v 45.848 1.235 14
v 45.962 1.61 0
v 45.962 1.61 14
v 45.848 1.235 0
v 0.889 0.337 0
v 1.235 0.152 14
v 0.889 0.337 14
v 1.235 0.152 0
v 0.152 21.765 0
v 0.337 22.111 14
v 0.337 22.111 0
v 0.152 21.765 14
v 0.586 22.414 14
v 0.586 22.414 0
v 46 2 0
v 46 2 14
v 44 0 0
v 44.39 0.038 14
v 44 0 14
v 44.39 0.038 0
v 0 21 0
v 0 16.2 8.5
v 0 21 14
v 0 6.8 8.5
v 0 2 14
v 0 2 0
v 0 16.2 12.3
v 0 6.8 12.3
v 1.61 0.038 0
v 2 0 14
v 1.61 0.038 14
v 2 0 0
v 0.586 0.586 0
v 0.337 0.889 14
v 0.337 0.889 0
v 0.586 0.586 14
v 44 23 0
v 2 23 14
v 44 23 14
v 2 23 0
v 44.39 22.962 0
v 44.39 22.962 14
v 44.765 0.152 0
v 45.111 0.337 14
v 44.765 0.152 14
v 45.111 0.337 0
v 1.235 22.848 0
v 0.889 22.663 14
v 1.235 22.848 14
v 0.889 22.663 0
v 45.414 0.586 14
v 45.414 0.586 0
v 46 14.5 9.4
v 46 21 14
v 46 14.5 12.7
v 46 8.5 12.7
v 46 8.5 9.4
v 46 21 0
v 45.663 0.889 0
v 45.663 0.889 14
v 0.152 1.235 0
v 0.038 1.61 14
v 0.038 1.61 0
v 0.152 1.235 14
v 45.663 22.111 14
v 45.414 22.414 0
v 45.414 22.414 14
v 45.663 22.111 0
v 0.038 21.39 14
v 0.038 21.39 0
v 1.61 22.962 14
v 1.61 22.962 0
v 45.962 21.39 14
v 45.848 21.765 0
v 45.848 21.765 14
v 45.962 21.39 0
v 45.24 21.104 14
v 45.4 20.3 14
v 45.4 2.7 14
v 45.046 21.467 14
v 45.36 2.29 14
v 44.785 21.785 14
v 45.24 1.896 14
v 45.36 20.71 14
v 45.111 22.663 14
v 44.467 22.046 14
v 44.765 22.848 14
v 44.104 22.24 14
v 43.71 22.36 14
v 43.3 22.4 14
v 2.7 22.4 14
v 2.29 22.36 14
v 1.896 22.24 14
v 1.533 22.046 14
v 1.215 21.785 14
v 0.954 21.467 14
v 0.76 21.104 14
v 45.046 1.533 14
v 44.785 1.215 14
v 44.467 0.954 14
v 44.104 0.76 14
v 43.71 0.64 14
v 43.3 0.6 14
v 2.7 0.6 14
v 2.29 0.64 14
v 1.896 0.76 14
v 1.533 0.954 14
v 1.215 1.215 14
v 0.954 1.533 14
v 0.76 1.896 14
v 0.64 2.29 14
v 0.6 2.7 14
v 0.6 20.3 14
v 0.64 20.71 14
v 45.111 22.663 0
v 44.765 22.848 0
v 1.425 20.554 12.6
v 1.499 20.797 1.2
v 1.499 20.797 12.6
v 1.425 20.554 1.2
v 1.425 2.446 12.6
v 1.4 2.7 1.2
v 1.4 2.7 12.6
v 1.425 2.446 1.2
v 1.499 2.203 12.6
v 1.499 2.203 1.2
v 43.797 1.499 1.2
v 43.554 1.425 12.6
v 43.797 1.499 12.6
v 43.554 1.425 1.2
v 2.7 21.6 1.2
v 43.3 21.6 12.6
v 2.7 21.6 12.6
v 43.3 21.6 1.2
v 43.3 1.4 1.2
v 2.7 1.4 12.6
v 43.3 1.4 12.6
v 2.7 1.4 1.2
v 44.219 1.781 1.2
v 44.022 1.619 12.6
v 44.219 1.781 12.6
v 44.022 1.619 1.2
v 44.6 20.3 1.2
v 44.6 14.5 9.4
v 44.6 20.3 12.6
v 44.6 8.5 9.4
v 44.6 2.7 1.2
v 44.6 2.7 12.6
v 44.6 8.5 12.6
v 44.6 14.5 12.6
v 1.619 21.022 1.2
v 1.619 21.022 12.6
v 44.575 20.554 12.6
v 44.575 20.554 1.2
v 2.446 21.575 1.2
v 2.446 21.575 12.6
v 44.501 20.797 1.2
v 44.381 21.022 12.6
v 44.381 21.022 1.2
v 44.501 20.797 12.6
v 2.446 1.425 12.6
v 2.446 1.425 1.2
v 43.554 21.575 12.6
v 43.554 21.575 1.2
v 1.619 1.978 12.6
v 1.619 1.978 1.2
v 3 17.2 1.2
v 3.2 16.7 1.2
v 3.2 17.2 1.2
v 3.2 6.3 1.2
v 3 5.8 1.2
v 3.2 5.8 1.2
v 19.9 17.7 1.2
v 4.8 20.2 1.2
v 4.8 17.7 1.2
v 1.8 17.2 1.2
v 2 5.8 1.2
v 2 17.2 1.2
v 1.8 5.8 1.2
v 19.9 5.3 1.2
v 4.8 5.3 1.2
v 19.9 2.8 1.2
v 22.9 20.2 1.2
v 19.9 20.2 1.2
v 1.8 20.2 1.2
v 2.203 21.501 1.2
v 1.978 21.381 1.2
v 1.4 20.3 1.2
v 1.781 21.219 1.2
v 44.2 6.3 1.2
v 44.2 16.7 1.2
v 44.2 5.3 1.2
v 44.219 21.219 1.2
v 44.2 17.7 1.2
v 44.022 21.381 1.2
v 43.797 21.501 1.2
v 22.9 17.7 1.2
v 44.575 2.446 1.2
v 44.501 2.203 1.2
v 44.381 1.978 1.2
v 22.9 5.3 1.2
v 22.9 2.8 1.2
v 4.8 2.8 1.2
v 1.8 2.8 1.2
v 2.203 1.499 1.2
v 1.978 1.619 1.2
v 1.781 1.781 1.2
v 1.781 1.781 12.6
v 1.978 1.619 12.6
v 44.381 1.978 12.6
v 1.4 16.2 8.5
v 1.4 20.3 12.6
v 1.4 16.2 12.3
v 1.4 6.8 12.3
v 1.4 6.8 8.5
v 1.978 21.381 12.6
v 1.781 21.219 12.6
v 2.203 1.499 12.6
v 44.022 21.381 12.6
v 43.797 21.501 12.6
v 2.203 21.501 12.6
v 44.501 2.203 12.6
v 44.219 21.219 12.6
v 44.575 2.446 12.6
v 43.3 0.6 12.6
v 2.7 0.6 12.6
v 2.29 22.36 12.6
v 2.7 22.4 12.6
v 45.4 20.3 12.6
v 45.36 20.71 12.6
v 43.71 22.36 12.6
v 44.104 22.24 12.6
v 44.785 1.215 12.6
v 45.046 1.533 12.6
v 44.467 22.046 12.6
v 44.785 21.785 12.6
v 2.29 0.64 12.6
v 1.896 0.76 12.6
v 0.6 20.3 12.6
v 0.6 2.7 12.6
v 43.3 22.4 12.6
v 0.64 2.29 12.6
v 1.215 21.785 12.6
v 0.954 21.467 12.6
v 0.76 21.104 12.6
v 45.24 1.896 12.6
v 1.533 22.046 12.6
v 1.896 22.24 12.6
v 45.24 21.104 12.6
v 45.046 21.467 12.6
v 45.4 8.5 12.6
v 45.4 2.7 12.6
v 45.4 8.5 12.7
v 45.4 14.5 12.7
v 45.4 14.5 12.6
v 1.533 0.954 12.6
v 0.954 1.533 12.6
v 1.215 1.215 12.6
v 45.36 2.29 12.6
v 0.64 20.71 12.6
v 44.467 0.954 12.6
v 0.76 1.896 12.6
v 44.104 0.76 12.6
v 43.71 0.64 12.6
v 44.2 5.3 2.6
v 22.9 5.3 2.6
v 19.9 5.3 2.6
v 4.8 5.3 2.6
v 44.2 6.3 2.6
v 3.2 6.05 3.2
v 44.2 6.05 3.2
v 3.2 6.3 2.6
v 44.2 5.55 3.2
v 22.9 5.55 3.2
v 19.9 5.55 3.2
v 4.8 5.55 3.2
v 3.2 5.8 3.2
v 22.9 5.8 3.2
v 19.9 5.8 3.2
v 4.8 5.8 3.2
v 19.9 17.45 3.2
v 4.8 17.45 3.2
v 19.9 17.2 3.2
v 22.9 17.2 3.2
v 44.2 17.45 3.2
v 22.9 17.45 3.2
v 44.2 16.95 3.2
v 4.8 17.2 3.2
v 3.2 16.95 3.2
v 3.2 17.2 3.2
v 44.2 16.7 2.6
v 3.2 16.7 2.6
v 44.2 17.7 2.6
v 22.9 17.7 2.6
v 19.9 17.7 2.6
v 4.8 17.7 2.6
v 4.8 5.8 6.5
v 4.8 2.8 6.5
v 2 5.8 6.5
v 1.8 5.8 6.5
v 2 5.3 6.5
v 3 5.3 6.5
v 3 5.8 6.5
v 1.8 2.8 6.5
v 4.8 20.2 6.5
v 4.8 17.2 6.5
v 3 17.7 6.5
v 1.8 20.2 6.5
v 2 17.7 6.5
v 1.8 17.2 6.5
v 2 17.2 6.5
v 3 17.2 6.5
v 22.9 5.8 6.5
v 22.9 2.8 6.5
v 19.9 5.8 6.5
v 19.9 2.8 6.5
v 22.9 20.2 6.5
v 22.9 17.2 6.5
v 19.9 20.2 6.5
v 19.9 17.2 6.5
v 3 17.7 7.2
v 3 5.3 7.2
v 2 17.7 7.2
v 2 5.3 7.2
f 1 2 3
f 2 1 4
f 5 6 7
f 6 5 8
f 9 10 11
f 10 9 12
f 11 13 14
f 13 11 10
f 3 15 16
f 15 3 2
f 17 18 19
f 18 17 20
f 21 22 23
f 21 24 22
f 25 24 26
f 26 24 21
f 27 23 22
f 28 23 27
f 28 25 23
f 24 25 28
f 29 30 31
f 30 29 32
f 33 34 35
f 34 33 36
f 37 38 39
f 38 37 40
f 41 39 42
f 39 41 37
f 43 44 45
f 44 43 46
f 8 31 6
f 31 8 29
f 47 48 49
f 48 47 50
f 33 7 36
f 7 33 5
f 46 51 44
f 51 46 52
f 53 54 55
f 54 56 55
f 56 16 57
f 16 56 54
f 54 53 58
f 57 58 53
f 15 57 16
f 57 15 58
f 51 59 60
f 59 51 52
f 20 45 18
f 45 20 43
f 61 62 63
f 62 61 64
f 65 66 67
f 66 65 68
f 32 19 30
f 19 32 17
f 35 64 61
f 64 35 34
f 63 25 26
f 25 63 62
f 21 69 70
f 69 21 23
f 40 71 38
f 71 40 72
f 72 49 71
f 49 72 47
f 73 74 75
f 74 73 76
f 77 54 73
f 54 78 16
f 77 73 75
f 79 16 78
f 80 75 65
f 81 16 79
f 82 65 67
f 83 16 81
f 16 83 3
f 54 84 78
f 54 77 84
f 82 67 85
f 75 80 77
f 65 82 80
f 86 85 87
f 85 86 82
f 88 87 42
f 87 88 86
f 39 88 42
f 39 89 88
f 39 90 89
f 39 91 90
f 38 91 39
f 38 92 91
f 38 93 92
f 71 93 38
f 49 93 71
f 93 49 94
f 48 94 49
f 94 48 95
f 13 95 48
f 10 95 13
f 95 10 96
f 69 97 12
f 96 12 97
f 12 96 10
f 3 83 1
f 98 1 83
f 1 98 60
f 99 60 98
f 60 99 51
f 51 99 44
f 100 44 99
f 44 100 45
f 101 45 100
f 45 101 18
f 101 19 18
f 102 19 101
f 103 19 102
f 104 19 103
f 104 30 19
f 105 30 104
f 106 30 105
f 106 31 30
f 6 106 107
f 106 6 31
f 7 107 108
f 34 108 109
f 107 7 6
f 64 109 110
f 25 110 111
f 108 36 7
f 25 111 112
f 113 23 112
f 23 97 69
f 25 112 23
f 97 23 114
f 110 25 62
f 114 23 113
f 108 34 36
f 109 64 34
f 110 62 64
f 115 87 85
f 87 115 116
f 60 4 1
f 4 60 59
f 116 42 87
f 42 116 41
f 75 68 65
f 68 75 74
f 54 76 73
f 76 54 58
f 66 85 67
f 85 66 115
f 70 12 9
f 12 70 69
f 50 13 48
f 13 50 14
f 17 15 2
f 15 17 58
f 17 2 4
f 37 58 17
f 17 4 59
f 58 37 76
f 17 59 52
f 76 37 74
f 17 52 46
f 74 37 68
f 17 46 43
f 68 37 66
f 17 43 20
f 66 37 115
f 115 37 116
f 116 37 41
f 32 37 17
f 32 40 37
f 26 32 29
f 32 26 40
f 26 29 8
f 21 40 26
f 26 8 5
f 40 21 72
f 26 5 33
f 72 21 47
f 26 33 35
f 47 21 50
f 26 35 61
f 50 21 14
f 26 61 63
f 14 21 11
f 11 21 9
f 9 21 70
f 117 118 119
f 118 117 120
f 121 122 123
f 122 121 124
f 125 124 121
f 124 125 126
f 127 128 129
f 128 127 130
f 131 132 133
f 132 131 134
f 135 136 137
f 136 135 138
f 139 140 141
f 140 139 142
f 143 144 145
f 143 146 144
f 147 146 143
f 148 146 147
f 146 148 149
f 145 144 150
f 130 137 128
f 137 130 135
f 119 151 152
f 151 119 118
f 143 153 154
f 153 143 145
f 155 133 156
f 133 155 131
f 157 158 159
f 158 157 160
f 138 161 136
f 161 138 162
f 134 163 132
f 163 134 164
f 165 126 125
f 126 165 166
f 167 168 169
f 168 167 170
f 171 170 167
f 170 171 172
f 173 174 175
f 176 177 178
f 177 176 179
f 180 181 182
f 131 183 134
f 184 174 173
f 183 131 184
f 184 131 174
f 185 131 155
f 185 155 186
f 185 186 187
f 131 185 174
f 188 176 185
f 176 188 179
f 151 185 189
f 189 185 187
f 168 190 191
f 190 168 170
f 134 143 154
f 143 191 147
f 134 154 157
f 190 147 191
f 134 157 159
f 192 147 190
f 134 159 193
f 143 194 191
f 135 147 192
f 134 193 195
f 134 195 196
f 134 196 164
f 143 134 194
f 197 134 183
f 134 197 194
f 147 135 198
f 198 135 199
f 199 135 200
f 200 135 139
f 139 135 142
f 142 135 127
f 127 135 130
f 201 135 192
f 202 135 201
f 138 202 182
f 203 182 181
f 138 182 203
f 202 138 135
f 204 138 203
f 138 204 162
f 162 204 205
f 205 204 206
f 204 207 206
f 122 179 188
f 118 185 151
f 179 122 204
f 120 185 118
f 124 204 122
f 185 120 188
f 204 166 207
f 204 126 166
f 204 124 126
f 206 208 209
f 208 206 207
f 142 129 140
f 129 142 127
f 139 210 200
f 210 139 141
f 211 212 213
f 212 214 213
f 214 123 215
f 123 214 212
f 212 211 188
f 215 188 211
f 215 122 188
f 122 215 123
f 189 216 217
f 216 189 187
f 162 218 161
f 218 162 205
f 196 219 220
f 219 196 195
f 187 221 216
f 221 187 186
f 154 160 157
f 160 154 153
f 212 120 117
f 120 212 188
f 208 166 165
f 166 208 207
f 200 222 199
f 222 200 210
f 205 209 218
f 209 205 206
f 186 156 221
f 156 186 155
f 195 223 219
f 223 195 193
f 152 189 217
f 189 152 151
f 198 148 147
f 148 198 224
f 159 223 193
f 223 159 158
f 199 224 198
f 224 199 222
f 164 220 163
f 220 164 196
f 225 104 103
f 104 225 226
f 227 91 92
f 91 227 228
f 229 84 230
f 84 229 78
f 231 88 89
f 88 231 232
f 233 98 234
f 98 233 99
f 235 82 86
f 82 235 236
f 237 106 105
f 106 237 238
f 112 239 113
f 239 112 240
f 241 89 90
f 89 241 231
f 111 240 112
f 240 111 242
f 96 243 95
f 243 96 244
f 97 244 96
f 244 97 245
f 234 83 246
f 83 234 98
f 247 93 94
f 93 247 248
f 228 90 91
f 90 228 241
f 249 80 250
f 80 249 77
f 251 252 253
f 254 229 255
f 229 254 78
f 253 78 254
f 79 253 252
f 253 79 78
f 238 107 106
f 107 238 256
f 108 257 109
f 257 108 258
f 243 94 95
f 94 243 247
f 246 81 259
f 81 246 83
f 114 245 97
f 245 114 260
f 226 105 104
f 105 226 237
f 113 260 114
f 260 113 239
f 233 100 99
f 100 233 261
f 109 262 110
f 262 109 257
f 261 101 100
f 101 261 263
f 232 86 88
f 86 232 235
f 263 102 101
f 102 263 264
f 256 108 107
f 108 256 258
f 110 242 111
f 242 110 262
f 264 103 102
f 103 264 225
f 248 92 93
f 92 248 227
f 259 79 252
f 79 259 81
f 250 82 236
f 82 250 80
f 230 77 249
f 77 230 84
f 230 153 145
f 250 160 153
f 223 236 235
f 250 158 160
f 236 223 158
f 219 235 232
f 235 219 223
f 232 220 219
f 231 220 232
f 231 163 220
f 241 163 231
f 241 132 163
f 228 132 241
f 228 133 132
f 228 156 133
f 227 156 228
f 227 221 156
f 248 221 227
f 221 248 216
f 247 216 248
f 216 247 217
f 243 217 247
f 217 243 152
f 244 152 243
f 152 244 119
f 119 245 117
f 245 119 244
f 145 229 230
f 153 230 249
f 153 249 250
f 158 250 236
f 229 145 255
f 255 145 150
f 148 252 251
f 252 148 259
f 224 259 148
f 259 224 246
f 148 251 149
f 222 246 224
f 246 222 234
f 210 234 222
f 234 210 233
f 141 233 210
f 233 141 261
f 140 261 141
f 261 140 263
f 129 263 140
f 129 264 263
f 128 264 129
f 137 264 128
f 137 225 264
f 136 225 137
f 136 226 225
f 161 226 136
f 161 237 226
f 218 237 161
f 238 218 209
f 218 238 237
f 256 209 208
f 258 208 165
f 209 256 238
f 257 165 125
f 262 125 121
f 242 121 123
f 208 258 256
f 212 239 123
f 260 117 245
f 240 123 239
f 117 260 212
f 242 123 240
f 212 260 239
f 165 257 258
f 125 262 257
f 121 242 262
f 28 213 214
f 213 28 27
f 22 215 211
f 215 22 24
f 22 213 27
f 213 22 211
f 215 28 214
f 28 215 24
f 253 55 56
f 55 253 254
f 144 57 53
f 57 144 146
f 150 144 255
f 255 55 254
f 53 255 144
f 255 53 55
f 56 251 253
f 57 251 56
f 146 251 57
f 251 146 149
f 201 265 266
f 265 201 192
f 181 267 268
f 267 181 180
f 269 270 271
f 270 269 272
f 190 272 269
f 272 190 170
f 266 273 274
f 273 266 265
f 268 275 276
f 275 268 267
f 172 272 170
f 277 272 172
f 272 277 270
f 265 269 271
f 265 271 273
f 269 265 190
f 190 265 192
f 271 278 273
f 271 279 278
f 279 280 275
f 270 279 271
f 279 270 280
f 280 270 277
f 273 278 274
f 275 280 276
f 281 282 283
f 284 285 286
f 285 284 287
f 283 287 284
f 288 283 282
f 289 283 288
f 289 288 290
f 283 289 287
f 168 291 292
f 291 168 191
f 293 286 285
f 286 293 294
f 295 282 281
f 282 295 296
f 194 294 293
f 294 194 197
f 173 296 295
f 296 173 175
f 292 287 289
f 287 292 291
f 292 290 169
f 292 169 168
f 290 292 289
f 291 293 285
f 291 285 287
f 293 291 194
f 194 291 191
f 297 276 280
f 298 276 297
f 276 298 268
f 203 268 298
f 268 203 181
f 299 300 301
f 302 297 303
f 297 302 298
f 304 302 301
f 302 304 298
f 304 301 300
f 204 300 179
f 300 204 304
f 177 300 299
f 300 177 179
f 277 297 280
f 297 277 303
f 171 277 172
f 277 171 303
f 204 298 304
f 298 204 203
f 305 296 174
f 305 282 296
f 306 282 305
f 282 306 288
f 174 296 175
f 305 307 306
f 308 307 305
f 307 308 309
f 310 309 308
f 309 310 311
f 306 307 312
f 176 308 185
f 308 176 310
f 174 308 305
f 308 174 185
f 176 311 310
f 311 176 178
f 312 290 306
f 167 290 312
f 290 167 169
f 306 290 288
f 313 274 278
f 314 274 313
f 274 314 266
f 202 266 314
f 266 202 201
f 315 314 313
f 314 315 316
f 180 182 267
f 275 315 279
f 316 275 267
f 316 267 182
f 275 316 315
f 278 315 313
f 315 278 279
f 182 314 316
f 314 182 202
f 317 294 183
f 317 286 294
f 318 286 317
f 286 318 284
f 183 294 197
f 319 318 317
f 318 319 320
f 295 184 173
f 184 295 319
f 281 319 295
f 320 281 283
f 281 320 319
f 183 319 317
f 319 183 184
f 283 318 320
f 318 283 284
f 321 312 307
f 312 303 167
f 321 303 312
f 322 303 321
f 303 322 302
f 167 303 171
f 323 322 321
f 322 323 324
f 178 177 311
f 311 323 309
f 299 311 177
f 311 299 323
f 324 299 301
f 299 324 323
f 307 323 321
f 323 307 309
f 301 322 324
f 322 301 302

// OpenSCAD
// bt_case.scad — parametric alternative to the provided enclosure (bt_case_base/lid.stl,
// also in ../enclosure/) for XIAO nRF52840 + 41x10x6 mm LiPo (brief §11, §12).
// Outer ≈ 46 x 23 x 14 mm, flush friction lid. Edit the parameters to fit other parts.
//
// Render:  openscad -D 'part="base"' -o bt_case_param_base.stl bt_case.scad
//          openscad -D 'part="lid"'  -o bt_case_param_lid.stl  bt_case.scad
//          openscad -D 'part="pads"' -o bt_case_param_pads.stl bt_case.scad   (TPU, or 1 mm silicone bumpers)
//
// Cell retention (§12): the pouch lies in a floor channel. Four corner columns stop
// one pad-thickness below a shelf plane `shelf_gap` (0.3 mm) above the pouch top; soft
// pads on them carry the PCB, so the board retains the cell without pressing on it.
// A hard spacer wall keeps the pouch out of the USB-C slot end.
part = "base";           // "base" | "lid" | "pads" | "both"

$fn = 32;
wall = 1.4;
floor_t = 1.2;
outer = [46, 23, 14];
lid_t = 1.4;             // lid plate, sits in a rebate flush with the rim
rebate = 0.8;            // rebate width cut into the wall top for the flush lid
lip_h = 2.0;             // friction lip depth under the lid plate
fit = 0.15;              // clearance per side for the friction fit
r = 2.0;                 // corner radius

board = [21.5, 17.8, 1.2];      // XIAO PCB
batt = [41, 10, 6];             // LiPo pouch
usb = [9.4, 3.8];               // USB-C opening (w x h)
shelf_gap = 0.3;                // board underside above the pouch top
pad = [3.0, 3.0, 1.0];          // soft stand-off pads (TPU / silicone)
spacer_t = 1.0;                 // hard wall between pouch and USB-C end

inner = [outer[0] - 2 * wall, outer[1] - 2 * wall];
cy = outer[1] / 2;
pouch_top = floor_t + batt[2];
shelf_z = pouch_top + shelf_gap;          // board underside
board_x0 = wall + 0.2;                    // board sits against the USB-C end
spacer_x = wall + 0.6;
pouch_x0 = spacer_x + spacer_t + 0.2;     // pouch starts behind the spacer
corner_xy = [for (x = [board_x0 + 0.2, board_x0 + board[0] - pad[0] - 0.2])
             for (y = [cy - board[1] / 2 + 0.2, cy + board[1] / 2 - pad[1] - 0.2]) [x, y]];

assert(pouch_x0 + batt[0] <= outer[0] - wall, "pouch does not fit the inner length");
assert(cy - board[1] / 2 + pad[1] < cy - batt[1] / 2 - 0.3, "corner columns would touch the pouch");

module rbox(s, rr) {
  hull() for (x = [rr, s[0] - rr], y = [rr, s[1] - rr]) translate([x, y, 0]) cylinder(r = rr, h = s[2]);
}

module base() {
  difference() {
    rbox(outer, r);
    // cavity
    translate([wall, wall, floor_t]) rbox([inner[0], inner[1], outer[2]], r - wall / 2);
    // rebate for the flush lid plate
    translate([wall - rebate, wall - rebate, outer[2] - lid_t])
      rbox([inner[0] + 2 * rebate, inner[1] + 2 * rebate, lid_t + 1], r - wall / 2 + rebate);
    // USB-C slot, near end (x = 0), level with the receptacle on top of the board
    translate([-1, cy - usb[0] / 2, shelf_z + board[2] - 0.2]) cube([wall + 2, usb[0], usb[1]]);
    // HY2.0 cable slot, far end (x = max): 4-wire lead to the Unit IR
    translate([outer[0] - wall - 1, cy - 3, outer[2] - lid_t - 3.2]) cube([wall + 2, 6, 3.3]);
  }
  // pouch channel rails (no sharp edges: chamfered tops)
  for (y = [cy - batt[1] / 2 - 1.2, cy + batt[1] / 2 + 0.2])
    translate([pouch_x0, y, floor_t]) hull() {
      cube([batt[0], 1.0, 1.4]);
      translate([0, 0.25, 0]) cube([batt[0], 0.5, 2.0]);
    }
  // hard spacer wall: pouch can't slide into the USB-C cutout
  translate([spacer_x, cy - batt[1] / 2 - 1.2, floor_t]) cube([spacer_t, batt[1] + 2.4, batt[2]]);
  // corner columns: top at shelf_z - pad thickness, the soft pads bring the board to shelf_z
  for (p = corner_xy) translate([p[0], p[1], floor_t]) cube([pad[0], pad[1], shelf_z - pad[2] - floor_t]);
}

module lid() {
  plate = [inner[0] + 2 * rebate - 2 * fit, inner[1] + 2 * rebate - 2 * fit];
  li = [inner[0] - 2 * fit, inner[1] - 2 * fit];
  rbox([plate[0], plate[1], lid_t], r - wall / 2 + rebate);
  translate([rebate, rebate, lid_t]) difference() {
    rbox([li[0], li[1], lip_h], r - wall / 2);
    translate([1.2, 1.2, -1]) rbox([li[0] - 2.4, li[1] - 2.4, lip_h + 2], max(0.5, r - wall / 2 - 1.2));
    // notch over the USB-C receptacle (it stands taller than the lip clearance)
    translate([-1, cy - wall - usb[0] / 2 - 0.5, -1]) cube([4, usb[0] + 1, lip_h + 2]);
  }
}

module pads() {
  for (i = [0:3]) translate([i * (pad[0] + 2), 0, 0]) cube(pad);
}

if (part == "base") base();
else if (part == "lid") lid();
else if (part == "pads") pads();
else { base(); translate([0, outer[1] + 5, 0]) lid(); translate([0, -pad[1] - 5, 0]) pads(); }
